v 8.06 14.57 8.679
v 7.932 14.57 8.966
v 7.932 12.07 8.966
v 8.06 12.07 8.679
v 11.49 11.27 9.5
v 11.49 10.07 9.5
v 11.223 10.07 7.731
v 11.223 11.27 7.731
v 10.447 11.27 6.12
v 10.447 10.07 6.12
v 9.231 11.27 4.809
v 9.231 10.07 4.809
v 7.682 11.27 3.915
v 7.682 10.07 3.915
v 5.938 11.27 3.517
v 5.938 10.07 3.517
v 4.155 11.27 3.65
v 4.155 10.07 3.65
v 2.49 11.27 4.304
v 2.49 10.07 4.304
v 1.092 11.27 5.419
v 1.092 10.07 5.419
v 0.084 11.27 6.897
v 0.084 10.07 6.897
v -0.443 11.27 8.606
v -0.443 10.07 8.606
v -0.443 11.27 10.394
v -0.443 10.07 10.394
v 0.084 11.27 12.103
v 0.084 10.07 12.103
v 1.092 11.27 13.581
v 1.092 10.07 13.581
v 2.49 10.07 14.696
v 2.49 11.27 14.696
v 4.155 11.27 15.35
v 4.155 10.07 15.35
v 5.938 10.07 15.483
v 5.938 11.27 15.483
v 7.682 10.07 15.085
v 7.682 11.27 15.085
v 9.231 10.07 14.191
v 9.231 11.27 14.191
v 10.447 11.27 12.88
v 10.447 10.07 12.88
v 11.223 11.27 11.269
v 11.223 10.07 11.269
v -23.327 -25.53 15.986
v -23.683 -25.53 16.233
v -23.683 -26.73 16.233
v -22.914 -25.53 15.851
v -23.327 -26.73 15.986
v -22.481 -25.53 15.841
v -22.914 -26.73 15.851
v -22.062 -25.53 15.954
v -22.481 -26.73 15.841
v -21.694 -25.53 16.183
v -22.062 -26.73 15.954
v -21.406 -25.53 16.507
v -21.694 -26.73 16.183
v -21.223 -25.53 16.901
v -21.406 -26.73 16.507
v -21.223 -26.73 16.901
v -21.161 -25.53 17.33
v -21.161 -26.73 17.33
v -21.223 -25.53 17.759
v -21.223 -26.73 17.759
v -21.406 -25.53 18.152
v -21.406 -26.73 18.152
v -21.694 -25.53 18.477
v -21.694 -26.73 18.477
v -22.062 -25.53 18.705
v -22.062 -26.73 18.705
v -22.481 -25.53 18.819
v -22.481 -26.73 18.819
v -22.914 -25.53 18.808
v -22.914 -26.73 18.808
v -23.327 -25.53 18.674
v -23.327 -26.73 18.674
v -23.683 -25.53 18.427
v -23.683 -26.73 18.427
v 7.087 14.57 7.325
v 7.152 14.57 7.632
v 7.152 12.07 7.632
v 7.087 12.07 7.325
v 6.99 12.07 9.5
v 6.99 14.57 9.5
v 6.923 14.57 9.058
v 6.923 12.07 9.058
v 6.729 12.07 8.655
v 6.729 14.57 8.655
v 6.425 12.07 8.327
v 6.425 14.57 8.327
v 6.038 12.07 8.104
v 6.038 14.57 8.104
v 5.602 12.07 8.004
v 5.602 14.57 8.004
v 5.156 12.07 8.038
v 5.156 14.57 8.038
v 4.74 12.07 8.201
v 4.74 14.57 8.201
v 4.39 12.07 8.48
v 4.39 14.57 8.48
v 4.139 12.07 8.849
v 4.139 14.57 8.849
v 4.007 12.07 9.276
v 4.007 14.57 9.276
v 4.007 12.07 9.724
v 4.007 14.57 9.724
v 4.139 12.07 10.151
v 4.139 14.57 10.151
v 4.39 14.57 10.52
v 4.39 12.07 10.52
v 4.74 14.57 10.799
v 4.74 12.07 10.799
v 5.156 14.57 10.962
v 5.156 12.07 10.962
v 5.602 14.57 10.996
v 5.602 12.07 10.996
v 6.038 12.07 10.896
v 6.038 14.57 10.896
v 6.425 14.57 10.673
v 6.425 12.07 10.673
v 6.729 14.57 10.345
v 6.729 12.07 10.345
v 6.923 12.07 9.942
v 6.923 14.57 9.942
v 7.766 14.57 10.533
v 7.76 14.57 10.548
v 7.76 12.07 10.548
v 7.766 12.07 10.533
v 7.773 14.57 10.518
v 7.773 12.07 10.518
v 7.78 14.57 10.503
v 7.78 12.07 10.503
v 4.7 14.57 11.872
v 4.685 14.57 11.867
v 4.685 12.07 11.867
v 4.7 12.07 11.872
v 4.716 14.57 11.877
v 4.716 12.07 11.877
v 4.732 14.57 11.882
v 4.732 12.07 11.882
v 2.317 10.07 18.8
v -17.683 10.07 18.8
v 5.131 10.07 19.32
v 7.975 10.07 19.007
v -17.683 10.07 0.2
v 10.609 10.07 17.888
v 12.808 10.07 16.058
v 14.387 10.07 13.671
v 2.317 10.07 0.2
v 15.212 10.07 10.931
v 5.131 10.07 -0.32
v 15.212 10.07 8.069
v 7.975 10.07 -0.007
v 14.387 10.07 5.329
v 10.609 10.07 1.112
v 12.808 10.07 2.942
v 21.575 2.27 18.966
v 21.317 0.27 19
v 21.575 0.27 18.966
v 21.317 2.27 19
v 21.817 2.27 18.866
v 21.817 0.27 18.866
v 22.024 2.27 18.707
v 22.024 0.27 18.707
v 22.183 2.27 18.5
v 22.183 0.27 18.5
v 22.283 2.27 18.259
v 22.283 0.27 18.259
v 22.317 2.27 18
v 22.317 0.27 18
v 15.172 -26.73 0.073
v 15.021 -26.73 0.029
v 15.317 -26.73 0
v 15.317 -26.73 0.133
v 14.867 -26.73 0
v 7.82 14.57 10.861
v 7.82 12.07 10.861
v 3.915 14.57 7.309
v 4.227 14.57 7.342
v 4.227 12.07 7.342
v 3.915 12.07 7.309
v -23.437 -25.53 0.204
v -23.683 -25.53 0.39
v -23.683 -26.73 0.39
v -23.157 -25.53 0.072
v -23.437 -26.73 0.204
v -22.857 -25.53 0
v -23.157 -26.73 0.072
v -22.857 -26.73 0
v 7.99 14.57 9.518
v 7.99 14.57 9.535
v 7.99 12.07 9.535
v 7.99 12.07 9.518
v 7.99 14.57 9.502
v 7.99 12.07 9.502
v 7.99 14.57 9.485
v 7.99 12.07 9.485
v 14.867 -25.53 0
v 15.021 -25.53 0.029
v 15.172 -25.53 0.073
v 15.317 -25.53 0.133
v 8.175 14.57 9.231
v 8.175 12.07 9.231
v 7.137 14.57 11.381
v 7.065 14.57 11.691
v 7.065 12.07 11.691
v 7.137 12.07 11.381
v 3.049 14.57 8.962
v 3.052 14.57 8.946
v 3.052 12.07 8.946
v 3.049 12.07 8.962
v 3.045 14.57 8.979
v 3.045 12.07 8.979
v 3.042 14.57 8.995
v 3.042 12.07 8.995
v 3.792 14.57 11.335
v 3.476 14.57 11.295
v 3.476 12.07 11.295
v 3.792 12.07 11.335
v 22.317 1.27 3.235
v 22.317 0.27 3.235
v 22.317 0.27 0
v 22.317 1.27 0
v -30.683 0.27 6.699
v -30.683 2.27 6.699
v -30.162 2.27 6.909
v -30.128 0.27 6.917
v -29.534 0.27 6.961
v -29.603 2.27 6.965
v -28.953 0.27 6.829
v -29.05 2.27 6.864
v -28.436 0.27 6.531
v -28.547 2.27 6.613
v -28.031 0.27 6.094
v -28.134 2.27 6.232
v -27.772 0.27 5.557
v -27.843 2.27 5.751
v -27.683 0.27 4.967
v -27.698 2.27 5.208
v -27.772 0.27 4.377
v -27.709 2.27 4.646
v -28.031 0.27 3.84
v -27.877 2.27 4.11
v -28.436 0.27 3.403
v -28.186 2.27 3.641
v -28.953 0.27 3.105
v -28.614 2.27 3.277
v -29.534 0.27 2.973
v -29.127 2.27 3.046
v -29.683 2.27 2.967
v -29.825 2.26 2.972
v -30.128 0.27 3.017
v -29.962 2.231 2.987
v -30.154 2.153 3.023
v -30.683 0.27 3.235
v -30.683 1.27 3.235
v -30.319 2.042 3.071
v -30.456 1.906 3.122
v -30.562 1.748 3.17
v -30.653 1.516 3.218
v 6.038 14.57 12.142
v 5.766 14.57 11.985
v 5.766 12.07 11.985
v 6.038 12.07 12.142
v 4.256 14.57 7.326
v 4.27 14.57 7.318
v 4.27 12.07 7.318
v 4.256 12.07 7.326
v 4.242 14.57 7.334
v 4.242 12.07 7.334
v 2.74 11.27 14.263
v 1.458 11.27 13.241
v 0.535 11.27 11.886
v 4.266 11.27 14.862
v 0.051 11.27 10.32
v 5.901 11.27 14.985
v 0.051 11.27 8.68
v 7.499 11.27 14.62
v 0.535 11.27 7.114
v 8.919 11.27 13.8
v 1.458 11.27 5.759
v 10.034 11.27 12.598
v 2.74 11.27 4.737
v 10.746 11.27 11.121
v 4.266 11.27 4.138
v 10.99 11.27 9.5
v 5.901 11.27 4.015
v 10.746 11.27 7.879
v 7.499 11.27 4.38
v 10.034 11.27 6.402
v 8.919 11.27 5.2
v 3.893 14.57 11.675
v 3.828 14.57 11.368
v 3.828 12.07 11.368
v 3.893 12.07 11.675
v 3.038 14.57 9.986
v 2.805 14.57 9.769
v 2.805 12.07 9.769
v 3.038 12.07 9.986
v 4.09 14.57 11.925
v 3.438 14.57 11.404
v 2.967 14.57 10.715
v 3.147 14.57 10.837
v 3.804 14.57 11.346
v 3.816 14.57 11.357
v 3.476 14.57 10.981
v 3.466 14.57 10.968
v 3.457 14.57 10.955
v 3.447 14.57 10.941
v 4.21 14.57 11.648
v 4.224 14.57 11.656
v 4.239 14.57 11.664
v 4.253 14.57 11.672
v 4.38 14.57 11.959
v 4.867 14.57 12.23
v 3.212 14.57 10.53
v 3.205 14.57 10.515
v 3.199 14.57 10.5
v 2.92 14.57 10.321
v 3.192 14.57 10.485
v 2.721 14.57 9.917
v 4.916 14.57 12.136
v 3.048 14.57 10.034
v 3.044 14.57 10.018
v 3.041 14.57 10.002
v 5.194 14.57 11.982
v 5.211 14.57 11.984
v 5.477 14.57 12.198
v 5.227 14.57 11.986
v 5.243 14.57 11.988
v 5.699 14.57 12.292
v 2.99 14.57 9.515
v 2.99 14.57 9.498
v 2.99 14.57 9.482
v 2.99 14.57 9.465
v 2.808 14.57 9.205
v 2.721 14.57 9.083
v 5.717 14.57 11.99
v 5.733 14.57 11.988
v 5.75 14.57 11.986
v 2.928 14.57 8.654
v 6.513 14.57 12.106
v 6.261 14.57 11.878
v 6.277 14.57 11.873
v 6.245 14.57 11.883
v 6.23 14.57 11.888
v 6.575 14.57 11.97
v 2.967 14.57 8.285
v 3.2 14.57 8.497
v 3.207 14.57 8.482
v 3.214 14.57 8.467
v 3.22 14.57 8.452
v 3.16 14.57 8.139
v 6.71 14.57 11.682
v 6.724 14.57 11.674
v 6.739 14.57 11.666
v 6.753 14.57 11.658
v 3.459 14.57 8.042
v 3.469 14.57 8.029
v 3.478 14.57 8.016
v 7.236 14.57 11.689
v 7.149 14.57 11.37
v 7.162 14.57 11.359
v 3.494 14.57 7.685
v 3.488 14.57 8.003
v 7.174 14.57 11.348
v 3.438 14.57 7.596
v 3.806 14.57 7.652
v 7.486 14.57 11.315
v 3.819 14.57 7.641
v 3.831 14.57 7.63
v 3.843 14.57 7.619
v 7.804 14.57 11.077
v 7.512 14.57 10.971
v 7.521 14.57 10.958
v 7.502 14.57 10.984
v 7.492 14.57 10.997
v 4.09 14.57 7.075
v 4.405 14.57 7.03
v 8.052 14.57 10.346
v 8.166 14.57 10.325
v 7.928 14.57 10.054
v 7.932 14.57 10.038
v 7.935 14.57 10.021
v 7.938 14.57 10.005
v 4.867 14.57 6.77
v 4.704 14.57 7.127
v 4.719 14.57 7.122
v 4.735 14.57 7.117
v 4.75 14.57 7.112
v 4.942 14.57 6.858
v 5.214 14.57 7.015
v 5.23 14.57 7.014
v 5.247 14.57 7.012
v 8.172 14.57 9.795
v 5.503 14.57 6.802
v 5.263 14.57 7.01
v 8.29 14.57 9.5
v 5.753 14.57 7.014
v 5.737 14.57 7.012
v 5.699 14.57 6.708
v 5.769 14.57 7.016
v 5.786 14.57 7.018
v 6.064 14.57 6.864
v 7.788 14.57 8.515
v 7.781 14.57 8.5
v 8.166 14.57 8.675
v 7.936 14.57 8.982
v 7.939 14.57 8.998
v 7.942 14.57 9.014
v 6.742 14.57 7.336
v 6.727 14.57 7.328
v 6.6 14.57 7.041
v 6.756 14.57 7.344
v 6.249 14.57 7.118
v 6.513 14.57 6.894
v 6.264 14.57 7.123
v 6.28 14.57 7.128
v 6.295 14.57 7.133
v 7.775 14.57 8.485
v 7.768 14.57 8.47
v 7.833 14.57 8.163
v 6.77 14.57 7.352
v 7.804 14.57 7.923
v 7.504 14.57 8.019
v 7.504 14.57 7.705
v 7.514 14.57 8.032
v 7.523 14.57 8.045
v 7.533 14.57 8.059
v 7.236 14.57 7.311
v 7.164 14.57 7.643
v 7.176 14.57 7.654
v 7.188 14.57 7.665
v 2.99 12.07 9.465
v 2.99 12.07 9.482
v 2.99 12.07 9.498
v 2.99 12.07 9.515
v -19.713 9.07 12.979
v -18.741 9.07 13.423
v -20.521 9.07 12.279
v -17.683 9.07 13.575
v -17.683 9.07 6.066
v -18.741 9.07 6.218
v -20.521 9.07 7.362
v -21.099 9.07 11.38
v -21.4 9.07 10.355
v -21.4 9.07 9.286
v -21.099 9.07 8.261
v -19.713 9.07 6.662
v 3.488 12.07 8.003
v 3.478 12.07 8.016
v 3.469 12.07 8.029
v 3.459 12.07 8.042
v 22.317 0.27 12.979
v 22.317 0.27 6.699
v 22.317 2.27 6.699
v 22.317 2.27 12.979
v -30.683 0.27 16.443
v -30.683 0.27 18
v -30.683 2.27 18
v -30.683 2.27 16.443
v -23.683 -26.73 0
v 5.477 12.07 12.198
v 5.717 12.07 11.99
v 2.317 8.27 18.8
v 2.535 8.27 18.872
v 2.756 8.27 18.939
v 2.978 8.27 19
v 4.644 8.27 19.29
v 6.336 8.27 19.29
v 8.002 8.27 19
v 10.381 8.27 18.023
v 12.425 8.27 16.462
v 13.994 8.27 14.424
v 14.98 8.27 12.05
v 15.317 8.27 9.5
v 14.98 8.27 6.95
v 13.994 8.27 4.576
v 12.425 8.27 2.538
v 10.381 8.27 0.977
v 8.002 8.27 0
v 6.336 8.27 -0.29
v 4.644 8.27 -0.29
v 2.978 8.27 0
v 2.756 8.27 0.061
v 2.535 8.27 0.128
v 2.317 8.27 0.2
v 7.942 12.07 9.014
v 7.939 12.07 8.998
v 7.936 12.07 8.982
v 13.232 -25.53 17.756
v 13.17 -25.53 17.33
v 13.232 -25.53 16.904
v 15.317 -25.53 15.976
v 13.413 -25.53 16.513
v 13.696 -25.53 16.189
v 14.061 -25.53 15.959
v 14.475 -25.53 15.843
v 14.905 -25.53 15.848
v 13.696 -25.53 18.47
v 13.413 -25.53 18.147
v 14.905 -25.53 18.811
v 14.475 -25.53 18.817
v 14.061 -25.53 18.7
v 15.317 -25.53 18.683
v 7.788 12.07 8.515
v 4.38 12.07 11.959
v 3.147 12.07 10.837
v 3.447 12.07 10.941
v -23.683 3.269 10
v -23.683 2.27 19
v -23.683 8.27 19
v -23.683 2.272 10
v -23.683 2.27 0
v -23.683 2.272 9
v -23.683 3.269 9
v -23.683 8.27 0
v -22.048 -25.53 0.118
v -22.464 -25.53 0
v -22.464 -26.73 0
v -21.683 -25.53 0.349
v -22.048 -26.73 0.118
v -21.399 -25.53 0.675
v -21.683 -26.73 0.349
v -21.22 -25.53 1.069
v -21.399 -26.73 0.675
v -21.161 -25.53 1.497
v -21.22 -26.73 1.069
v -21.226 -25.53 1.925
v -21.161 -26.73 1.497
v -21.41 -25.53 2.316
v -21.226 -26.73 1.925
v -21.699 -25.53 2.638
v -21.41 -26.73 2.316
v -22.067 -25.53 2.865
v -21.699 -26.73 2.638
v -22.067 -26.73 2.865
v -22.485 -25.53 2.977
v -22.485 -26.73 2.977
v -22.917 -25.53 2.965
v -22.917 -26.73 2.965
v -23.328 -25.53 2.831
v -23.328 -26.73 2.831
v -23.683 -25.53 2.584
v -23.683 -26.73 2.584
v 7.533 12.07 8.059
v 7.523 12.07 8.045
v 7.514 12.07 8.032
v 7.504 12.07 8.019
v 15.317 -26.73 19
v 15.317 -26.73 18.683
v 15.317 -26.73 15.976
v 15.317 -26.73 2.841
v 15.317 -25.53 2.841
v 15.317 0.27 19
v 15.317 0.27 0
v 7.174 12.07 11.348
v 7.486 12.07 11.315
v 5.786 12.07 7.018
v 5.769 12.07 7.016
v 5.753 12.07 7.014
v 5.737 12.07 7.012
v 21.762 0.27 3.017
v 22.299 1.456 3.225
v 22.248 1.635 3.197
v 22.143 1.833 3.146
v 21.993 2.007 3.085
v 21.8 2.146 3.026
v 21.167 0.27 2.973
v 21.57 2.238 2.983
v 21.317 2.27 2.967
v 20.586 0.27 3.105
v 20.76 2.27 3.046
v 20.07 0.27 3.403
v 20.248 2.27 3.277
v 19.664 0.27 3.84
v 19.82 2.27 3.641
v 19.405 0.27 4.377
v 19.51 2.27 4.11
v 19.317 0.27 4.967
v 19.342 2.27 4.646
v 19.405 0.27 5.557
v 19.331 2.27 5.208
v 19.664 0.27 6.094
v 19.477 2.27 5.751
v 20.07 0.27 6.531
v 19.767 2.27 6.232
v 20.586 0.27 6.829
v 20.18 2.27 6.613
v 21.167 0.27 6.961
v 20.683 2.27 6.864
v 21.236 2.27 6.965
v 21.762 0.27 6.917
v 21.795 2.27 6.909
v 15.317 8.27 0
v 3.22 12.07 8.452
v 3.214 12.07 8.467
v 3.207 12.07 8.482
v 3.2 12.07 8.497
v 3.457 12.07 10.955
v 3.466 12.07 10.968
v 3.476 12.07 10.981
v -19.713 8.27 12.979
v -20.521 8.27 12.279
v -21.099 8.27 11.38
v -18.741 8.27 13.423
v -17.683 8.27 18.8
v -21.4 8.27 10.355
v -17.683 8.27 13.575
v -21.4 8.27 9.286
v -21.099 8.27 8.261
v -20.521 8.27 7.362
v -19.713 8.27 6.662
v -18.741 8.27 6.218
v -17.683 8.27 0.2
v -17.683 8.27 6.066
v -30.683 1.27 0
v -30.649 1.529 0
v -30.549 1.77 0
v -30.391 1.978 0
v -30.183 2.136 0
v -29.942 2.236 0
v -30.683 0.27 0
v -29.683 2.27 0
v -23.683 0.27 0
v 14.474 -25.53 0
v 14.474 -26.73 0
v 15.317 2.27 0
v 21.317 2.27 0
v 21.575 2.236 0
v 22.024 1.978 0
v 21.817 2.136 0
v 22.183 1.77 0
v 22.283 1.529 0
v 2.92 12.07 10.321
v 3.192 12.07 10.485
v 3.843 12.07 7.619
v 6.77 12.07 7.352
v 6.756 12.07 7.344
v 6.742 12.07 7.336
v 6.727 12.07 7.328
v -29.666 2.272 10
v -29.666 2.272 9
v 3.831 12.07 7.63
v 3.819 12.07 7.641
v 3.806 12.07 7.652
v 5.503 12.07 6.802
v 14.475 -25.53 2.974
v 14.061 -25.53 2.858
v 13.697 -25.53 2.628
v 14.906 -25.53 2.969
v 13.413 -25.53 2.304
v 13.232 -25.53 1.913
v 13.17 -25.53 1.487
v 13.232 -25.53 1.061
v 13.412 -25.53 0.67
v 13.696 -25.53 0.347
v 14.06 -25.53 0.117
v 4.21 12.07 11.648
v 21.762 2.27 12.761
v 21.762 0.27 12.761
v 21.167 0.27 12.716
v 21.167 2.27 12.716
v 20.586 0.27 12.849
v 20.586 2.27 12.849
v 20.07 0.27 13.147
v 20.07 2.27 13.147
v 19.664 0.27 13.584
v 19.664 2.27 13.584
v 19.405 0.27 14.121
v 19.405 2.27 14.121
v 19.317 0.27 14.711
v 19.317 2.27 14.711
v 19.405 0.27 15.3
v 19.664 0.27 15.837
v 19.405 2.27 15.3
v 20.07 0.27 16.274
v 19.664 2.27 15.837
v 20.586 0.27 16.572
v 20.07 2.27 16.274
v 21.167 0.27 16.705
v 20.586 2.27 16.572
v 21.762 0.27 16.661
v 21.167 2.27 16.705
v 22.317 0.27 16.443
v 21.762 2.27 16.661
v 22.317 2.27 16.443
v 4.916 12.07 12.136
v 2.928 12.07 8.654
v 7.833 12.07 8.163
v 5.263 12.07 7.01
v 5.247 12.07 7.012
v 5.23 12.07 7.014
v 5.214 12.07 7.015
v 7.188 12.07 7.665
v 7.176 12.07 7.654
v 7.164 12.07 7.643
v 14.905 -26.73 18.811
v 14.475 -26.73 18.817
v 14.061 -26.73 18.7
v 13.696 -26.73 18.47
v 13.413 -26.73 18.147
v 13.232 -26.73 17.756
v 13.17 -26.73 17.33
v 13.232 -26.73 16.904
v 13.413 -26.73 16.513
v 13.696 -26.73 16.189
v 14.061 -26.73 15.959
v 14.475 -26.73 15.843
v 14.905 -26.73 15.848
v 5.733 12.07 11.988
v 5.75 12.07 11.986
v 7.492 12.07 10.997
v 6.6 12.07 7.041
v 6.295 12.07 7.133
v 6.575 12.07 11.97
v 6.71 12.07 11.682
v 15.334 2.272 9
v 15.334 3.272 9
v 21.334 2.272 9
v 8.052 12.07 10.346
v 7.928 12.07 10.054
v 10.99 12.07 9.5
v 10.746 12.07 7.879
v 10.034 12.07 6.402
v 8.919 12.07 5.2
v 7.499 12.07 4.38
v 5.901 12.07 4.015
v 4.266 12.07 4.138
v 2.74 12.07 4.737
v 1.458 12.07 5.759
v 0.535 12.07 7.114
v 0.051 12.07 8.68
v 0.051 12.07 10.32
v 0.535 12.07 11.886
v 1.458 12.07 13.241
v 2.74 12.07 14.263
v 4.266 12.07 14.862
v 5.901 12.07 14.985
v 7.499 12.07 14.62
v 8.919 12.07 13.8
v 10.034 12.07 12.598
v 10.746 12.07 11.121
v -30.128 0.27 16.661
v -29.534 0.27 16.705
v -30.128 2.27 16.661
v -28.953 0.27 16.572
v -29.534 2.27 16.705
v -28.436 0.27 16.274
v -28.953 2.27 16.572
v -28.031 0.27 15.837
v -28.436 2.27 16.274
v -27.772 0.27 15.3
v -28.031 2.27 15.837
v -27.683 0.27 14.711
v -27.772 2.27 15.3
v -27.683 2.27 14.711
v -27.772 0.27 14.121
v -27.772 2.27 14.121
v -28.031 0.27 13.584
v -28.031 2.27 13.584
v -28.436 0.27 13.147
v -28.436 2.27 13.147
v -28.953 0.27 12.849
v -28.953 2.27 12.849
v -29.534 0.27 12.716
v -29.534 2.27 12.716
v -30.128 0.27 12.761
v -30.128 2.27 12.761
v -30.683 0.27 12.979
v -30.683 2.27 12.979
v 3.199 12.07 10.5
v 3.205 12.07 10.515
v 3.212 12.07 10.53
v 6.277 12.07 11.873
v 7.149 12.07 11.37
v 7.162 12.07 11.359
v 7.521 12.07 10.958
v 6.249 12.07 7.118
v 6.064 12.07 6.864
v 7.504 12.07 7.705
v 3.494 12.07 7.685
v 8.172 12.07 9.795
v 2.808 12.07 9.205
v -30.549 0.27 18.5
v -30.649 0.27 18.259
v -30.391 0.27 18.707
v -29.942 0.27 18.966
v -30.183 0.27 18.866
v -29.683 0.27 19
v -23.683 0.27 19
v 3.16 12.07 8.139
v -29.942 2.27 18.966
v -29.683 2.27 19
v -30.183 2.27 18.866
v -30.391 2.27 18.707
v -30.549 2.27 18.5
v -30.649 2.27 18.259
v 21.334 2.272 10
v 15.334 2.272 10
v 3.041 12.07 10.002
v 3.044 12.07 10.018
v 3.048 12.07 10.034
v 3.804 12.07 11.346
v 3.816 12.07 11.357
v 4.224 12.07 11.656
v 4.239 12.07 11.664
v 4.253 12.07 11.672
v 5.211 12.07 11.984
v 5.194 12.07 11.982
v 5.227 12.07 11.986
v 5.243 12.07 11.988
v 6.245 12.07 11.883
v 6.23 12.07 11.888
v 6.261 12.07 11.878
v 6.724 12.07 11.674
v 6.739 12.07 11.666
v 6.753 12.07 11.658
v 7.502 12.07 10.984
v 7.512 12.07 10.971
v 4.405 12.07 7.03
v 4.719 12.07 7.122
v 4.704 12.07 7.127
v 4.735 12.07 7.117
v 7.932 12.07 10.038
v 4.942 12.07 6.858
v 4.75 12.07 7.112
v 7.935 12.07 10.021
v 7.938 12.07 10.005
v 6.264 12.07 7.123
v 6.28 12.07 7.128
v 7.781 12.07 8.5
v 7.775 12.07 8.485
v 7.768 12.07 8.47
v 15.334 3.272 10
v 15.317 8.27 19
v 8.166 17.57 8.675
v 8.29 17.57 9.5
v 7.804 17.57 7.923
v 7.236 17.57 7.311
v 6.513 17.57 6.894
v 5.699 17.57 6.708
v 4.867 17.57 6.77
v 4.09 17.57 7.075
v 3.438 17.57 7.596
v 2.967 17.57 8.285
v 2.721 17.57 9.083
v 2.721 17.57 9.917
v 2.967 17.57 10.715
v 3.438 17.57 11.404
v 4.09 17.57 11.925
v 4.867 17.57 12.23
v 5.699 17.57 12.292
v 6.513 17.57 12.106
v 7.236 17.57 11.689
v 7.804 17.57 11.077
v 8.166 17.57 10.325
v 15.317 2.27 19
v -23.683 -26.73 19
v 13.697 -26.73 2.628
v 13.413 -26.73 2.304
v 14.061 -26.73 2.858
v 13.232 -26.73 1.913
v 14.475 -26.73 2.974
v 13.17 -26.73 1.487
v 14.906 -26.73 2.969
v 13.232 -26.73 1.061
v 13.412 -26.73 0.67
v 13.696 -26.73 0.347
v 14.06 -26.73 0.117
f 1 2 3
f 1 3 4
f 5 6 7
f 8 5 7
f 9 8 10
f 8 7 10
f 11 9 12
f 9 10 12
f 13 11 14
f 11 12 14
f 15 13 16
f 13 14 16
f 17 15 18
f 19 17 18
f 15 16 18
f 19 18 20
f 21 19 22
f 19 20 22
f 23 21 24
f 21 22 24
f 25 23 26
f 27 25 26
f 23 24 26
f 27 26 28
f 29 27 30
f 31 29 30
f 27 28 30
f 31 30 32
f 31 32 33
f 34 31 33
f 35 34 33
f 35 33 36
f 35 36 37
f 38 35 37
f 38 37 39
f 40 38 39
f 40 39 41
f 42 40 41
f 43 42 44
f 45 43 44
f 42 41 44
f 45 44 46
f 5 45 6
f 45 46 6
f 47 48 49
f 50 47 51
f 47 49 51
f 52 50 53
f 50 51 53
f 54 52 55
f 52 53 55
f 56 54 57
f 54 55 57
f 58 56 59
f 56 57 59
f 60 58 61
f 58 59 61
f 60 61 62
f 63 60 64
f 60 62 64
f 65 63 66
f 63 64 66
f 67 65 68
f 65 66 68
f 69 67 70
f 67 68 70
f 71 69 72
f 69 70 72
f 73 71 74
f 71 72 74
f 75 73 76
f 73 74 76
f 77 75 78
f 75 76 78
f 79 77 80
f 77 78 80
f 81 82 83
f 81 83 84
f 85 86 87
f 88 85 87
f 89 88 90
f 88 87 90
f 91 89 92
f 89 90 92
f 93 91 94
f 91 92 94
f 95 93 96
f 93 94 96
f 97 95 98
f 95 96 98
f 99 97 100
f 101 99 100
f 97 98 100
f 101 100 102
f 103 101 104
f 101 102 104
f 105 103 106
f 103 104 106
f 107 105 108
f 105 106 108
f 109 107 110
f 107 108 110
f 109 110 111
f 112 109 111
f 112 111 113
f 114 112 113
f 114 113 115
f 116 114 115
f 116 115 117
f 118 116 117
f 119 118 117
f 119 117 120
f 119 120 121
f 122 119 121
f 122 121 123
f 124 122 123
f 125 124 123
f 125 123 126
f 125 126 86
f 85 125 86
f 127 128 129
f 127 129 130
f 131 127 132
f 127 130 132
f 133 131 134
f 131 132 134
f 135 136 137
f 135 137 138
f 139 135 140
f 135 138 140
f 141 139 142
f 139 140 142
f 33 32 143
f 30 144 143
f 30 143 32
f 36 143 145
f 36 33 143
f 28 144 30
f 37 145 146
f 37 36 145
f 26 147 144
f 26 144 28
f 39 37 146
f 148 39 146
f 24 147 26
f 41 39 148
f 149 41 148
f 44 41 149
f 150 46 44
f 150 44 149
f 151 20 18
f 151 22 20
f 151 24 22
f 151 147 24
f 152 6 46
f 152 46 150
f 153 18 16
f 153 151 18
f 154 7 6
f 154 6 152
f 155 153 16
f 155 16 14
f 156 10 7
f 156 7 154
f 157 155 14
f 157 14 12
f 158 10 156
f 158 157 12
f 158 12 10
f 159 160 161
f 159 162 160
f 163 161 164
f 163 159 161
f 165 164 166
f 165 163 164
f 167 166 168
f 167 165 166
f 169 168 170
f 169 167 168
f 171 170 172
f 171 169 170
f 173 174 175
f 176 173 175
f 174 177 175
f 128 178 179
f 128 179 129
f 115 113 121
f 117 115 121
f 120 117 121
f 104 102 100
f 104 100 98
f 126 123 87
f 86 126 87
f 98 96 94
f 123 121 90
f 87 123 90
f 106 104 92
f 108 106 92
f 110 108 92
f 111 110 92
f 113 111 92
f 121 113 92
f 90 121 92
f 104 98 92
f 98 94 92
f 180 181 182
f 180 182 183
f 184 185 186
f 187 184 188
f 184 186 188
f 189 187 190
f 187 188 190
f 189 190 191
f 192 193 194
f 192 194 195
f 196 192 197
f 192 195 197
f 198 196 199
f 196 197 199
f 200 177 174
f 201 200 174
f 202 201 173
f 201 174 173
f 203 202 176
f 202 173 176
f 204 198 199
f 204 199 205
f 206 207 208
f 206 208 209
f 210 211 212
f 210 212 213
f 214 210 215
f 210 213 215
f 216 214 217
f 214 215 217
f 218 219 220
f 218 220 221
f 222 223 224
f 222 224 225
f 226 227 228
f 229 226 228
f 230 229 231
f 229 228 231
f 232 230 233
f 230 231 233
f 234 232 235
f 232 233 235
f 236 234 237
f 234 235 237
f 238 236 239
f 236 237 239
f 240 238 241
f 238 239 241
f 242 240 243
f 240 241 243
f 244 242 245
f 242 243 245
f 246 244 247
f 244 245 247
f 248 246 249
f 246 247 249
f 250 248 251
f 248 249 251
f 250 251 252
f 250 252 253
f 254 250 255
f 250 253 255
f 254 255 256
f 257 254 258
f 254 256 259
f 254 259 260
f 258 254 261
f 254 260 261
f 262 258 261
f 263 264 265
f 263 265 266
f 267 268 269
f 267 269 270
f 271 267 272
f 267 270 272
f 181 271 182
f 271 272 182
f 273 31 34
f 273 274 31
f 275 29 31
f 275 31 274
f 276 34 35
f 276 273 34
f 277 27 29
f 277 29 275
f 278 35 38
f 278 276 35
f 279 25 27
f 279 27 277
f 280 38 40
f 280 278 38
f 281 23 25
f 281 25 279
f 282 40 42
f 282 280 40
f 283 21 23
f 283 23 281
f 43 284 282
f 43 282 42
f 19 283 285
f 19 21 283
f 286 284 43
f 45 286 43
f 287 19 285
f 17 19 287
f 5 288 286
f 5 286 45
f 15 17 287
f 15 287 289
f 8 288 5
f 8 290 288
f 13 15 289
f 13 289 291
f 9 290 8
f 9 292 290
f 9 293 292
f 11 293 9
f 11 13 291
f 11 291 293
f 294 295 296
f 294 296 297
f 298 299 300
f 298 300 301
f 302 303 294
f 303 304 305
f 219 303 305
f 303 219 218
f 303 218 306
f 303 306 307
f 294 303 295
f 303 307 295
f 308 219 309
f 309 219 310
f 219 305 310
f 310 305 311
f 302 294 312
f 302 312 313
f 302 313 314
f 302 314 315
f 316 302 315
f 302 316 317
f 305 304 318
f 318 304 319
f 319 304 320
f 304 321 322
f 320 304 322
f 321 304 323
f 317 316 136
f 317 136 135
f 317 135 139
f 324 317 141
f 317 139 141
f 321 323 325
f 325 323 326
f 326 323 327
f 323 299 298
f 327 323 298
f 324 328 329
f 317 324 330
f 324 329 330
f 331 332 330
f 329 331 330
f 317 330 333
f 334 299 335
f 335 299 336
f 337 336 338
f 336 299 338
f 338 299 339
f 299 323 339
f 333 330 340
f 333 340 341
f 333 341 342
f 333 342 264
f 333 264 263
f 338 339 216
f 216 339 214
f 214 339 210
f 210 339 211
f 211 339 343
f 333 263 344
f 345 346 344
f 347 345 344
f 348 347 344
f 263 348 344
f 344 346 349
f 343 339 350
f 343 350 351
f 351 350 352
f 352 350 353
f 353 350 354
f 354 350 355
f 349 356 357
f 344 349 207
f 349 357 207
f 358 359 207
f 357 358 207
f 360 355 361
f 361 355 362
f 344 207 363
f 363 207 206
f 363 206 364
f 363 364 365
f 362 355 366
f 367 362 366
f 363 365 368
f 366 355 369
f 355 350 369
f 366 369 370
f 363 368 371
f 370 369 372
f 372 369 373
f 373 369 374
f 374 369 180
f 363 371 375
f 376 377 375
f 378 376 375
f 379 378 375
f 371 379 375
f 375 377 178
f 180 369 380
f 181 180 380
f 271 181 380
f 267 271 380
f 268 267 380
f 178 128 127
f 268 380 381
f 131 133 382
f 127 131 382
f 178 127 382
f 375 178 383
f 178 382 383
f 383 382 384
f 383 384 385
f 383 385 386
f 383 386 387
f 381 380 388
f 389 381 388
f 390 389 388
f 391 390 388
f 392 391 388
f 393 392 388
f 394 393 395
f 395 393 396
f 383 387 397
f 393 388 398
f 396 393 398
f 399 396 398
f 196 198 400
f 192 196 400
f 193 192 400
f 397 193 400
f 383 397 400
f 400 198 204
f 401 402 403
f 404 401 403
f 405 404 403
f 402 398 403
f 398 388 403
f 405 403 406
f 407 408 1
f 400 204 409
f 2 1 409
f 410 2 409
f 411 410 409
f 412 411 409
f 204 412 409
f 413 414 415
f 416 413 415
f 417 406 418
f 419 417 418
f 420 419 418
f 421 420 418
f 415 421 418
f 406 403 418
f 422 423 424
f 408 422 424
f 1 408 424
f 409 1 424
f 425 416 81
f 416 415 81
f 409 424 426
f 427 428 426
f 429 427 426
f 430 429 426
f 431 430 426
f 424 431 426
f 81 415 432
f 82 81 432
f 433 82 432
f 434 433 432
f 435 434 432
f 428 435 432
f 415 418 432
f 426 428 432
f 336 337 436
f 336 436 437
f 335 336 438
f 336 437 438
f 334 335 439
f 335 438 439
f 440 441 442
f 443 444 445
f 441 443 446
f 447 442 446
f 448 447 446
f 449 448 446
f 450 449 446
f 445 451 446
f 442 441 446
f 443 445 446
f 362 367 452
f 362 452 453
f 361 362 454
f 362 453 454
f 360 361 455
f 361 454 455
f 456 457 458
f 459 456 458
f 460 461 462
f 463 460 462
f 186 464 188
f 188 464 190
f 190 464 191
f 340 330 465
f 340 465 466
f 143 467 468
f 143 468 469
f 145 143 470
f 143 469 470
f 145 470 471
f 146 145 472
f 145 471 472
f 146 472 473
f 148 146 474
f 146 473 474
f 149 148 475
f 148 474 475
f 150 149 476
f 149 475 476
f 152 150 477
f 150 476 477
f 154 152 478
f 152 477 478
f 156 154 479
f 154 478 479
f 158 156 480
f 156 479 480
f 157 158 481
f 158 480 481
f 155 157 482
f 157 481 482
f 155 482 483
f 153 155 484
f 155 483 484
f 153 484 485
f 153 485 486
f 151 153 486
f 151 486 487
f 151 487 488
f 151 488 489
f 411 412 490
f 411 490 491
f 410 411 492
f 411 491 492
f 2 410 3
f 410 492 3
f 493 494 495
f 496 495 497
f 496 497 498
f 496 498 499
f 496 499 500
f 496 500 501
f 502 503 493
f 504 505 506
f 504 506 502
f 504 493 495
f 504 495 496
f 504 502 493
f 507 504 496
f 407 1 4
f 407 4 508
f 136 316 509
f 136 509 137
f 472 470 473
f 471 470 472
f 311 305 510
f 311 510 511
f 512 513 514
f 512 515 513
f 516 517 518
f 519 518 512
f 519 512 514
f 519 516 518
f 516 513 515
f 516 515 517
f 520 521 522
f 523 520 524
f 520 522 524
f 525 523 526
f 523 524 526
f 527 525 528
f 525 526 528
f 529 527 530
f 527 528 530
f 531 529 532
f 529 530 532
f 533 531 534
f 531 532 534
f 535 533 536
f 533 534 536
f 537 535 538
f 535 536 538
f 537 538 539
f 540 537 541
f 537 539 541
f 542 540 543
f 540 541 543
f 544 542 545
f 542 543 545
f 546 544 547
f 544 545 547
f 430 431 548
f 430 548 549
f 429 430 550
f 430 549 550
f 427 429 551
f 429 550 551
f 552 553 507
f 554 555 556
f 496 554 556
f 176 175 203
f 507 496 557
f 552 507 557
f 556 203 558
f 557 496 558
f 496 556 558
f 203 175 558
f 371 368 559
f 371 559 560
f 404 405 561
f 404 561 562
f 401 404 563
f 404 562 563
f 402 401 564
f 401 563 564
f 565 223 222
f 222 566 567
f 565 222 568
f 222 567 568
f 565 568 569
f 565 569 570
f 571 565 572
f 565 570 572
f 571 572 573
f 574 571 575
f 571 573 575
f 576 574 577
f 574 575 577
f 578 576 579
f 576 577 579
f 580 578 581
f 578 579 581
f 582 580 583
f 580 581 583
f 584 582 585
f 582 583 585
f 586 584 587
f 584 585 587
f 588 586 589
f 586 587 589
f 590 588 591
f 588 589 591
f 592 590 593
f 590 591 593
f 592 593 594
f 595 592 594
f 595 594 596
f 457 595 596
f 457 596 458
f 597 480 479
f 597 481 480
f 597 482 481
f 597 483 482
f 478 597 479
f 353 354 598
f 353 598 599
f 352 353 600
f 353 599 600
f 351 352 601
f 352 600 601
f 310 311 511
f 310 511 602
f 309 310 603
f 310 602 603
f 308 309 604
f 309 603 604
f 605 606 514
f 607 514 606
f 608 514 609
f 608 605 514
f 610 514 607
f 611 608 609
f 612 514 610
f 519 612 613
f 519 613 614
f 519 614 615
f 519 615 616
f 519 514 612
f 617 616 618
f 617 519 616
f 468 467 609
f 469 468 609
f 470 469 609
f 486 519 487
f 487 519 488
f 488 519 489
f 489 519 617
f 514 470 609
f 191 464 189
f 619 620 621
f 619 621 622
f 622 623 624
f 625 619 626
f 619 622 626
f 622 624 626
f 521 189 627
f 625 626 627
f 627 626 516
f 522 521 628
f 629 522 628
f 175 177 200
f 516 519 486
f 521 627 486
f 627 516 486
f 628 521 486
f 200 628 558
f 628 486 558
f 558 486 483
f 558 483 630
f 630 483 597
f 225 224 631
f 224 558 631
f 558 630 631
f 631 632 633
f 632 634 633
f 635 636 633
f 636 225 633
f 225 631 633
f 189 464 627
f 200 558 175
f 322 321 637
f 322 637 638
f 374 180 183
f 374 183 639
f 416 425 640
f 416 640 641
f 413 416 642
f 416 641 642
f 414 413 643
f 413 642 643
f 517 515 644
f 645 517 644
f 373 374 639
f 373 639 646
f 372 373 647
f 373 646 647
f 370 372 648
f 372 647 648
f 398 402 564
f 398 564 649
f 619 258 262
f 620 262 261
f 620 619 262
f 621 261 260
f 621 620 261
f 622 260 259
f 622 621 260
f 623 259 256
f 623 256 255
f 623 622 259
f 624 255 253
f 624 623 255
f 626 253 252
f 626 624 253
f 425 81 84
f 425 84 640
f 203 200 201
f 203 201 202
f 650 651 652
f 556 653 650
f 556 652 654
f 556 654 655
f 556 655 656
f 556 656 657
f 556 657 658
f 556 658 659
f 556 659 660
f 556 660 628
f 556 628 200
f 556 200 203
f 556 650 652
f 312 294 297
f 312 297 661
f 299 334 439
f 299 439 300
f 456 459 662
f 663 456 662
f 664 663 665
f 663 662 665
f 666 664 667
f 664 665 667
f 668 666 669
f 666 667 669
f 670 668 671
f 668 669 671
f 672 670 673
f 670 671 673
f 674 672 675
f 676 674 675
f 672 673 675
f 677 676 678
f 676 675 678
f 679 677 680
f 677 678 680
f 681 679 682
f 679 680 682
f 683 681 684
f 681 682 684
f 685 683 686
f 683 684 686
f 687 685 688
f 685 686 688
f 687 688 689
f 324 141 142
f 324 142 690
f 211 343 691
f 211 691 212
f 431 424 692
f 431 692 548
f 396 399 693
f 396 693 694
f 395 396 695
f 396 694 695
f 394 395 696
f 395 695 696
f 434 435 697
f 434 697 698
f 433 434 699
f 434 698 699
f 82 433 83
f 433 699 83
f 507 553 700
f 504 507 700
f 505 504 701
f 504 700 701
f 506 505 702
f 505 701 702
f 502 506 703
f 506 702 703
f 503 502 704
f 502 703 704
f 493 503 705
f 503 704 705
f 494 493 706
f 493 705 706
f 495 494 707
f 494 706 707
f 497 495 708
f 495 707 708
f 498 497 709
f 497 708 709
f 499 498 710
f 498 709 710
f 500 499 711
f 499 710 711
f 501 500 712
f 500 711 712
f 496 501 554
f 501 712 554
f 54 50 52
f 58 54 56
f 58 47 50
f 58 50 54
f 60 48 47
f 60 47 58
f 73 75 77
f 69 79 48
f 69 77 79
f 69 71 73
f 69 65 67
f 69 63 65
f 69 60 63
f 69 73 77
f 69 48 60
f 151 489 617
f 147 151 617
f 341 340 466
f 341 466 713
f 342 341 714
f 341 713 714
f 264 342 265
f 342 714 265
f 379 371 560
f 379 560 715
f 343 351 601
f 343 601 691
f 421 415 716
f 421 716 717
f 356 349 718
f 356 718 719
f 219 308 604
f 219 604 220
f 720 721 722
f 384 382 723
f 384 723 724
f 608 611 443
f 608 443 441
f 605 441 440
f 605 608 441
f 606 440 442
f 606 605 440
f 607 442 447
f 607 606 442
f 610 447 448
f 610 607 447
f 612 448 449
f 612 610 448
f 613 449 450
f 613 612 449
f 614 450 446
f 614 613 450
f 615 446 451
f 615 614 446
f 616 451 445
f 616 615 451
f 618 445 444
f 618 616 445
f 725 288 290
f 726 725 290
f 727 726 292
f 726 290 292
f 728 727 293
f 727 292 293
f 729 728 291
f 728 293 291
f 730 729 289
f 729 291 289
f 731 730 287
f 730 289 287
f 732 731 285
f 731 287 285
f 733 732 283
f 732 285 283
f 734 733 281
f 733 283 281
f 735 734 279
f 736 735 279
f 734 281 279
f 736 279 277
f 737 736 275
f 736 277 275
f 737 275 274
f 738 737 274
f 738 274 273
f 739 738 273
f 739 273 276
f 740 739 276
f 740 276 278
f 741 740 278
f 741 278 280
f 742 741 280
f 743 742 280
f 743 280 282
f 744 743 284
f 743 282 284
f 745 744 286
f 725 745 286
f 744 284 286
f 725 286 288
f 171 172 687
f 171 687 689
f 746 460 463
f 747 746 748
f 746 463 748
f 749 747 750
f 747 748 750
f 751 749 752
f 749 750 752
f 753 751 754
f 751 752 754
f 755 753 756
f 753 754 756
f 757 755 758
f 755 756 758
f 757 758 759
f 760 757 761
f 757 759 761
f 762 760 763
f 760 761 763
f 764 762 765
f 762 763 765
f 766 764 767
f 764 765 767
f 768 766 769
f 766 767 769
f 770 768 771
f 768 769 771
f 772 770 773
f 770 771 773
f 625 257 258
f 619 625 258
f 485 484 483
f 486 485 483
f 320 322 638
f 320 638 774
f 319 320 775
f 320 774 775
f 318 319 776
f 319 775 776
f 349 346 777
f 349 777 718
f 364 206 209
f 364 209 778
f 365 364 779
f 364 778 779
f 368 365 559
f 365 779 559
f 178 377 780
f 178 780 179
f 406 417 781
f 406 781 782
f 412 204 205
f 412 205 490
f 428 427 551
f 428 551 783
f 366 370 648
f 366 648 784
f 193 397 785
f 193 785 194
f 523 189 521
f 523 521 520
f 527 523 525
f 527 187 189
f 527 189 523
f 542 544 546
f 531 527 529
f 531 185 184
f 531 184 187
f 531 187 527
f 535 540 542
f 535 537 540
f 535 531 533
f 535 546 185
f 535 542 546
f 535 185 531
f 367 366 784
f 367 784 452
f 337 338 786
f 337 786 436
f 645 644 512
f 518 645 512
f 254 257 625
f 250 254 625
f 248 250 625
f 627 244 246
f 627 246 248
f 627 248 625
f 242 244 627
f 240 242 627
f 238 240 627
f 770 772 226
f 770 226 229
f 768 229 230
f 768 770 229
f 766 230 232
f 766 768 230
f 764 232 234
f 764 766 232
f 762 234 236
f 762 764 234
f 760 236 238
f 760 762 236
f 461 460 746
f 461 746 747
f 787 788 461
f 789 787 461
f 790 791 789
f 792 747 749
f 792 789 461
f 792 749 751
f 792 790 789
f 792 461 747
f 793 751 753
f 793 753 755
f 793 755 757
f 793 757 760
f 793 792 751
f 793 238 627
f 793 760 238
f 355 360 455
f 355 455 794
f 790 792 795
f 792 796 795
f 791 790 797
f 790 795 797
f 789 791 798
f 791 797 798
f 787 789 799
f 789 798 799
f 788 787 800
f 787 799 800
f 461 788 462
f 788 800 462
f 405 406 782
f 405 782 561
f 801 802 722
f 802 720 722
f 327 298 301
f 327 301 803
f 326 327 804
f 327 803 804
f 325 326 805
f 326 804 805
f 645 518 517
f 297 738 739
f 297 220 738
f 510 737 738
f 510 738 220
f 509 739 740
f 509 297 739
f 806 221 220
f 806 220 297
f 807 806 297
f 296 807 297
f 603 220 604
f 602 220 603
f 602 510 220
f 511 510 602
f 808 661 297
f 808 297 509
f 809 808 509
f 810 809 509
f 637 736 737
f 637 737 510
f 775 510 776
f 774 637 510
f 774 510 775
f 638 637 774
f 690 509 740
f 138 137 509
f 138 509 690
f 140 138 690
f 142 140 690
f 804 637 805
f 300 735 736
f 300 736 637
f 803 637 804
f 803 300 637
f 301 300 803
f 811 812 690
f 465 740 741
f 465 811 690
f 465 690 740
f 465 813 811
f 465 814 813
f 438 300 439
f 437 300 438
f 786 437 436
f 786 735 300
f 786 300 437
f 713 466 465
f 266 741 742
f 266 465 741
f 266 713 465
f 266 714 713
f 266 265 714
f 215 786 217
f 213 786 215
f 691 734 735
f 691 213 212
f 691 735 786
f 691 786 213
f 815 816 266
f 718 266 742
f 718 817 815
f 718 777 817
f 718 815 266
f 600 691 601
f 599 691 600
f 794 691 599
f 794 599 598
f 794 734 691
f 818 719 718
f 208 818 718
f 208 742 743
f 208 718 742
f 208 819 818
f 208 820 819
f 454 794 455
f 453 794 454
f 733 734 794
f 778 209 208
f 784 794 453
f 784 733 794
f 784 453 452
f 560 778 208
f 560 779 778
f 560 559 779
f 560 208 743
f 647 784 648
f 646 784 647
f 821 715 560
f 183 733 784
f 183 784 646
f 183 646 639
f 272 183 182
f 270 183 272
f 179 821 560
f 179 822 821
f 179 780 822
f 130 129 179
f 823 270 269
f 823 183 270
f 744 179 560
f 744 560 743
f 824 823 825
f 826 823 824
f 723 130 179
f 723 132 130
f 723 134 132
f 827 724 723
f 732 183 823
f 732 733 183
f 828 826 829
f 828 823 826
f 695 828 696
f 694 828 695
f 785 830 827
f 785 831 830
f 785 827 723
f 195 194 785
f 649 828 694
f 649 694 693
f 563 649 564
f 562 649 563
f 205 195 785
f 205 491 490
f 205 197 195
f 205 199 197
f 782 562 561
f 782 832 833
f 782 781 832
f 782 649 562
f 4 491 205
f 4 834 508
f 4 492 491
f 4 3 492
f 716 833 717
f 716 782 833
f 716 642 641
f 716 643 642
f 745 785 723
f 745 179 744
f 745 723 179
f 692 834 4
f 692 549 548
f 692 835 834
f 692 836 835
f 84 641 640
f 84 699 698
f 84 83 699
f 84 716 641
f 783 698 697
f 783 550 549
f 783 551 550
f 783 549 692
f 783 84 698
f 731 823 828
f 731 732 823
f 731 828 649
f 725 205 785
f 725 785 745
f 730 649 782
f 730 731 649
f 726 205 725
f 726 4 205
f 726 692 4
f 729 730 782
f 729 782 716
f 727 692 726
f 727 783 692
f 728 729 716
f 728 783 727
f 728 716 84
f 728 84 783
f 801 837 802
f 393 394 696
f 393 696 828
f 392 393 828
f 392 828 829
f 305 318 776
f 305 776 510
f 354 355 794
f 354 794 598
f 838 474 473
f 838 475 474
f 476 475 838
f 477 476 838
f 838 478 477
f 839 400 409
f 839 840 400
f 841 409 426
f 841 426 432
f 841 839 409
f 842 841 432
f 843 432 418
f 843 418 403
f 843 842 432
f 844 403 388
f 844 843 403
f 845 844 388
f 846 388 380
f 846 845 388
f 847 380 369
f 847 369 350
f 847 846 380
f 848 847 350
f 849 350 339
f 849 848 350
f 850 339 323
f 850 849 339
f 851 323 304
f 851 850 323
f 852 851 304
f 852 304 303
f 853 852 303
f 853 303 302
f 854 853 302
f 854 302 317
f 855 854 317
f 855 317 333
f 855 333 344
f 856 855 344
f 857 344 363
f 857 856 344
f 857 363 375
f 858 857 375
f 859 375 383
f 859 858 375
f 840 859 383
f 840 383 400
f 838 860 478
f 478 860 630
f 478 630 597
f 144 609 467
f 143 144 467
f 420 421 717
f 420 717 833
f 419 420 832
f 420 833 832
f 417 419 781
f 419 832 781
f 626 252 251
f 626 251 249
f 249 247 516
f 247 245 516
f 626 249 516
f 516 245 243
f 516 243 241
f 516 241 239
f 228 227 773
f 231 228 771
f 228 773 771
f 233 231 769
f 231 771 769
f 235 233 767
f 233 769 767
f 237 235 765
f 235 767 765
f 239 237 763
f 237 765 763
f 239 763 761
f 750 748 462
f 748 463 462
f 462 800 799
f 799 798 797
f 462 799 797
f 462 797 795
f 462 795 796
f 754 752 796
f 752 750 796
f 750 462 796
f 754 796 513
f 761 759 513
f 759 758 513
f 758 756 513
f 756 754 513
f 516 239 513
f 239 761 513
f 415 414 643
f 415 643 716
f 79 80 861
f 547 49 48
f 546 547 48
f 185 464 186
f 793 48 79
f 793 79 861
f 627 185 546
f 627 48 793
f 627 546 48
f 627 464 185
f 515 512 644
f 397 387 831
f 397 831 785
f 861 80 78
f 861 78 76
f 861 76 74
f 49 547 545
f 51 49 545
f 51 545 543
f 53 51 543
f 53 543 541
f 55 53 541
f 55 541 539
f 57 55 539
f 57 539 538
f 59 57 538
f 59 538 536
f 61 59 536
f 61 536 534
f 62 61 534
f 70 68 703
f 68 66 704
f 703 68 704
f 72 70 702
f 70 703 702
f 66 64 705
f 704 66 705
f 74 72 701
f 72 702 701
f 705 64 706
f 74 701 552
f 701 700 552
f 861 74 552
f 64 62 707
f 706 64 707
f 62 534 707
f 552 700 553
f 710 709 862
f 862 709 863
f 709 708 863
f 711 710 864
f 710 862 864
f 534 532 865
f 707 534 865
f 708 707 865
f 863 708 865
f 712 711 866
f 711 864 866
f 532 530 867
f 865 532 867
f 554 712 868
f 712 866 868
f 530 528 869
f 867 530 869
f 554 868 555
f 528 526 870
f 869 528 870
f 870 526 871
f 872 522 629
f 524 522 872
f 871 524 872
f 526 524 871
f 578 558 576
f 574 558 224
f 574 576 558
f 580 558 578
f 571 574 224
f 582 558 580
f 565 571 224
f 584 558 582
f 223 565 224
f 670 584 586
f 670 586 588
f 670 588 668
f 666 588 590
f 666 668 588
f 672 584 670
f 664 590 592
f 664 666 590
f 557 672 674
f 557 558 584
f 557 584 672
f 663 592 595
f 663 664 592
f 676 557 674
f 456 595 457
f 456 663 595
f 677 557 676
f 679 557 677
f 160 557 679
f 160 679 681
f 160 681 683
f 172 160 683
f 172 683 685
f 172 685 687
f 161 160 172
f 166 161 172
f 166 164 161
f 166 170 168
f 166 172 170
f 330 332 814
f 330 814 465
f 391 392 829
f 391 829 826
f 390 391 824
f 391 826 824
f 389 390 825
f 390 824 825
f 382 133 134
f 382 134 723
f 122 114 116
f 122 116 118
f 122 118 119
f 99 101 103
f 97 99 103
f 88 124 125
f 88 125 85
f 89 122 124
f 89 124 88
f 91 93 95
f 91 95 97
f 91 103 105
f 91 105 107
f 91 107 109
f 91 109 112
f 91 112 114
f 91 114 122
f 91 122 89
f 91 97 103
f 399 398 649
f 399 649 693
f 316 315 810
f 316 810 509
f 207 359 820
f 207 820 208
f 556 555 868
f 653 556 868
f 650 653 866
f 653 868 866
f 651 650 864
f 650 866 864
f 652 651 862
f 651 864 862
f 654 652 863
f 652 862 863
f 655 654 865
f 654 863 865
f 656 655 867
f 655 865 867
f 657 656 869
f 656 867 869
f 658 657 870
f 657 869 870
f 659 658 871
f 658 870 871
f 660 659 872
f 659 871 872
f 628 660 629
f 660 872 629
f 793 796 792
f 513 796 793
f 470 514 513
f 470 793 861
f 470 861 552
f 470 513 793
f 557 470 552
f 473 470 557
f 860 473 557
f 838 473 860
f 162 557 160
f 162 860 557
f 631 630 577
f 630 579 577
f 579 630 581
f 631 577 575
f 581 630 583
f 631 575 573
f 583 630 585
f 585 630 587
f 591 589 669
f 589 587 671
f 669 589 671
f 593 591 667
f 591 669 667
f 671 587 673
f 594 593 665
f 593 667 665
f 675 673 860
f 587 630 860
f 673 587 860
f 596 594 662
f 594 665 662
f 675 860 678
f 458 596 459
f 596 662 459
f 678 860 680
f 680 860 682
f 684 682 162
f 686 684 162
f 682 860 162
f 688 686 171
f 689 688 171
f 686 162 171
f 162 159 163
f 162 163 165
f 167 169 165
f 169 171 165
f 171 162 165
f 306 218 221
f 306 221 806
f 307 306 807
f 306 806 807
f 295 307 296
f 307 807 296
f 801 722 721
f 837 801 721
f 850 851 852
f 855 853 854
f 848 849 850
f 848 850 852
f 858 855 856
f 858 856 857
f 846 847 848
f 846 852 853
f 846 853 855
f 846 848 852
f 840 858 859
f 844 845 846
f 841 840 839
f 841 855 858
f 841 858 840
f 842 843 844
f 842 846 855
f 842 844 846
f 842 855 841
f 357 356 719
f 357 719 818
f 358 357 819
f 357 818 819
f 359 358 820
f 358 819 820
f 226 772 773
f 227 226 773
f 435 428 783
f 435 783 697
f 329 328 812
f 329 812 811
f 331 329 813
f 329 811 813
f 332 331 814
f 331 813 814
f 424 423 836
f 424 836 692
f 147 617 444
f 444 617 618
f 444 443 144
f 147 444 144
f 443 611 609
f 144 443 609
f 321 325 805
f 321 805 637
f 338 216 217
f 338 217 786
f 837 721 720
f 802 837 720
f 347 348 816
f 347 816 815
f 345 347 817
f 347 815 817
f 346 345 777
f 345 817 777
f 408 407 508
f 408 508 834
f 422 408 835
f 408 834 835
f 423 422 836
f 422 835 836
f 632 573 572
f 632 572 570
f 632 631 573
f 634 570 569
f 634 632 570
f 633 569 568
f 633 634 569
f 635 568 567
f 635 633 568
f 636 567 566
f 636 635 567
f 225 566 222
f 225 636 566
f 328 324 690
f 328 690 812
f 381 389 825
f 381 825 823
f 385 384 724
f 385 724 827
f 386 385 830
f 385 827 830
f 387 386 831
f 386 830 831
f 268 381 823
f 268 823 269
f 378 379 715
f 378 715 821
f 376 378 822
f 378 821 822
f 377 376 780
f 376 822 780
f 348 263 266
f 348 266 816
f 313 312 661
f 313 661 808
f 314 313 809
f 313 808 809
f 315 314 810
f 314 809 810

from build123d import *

# Parameters (mm, degrees)
SKETCH1_W            = 39
SKETCH1_H            = 35
BOSS_EXTRUDE1_DEPTH  = 19
SKETCH2_W            = 7
SKETCH2_H            = 2
BOSS_EXTRUDE2_DEPTH  = 19
BOSS_EXTRUDE3_DEPTH  = 0.5
SKETCH4_R            = 2
CUT_EXTRUDE1_DEPTH   = 3
FILLET1_R            = 1
BOSS_EXTRUDE4_DEPTH  = 1.8
SKETCH6_R            = 1.5
CUT_EXTRUDE2_DEPTH   = 1.2
SKETCH7_R            = 6
BOSS_EXTRUDE5_DEPTH  = 1.2
SKETCH8_R            = 5.5
BOSS_EXTRUDE6_DEPTH  = 0.8
BOSS_EXTRUDE7_DEPTH  = 0.8
SKETCH10_R           = 2.5
BOSS_EXTRUDE8_DEPTH  = 4
BOSS_EXTRUDE9_DEPTH  = 4
CIRPATTERN2_COUNT    = 30
SKETCH12_R           = 1.5
CUT_EXTRUDE4_DEPTH   = 4
SKETCH13_R           = 2.8
BOSS_EXTRUDE10_DEPTH = 1.5


with BuildPart() as part:
    # Sketch1 → Boss-Extrude1 (new body)
    with BuildSketch(Plane.XY):
        with Locations((-4.183412042, -9.229571984)):
            Rectangle(SKETCH1_W, SKETCH1_H)
    extrude(amount=BOSS_EXTRUDE1_DEPTH)

    # Sketch2 → Boss-Extrude2 (add)
    with BuildSketch(Plane.XY.offset(19)):
        with Locations((18.816587958, 1.270428016)):
            Rectangle(SKETCH2_W, SKETCH2_H)
        with Locations((-27.183412042, 1.270428016)):
            Rectangle(SKETCH2_W, SKETCH2_H)
    extrude(amount=-BOSS_EXTRUDE2_DEPTH)

    # Sketch3 → Boss-Extrude3 (add, symmetric)
    with BuildSketch(Plane.XY.offset(9.5)):
        Polygon((15.333582704, 3.272295291), (15.333582704, 2.272295291), (21.333582704, 2.272295291), align=None)
        Polygon((-29.666485395, 2.272295291), (-23.666485395, 3.272295291), (-23.666485395, 2.272295291), align=None)
    extrude(amount=BOSS_EXTRUDE3_DEPTH, both=True)

    # Sketch4 → Cut-Extrude1 (cut)
    with BuildSketch(Plane(origin=(0, 2.270428016, 0), x_dir=(1, 0, 0), z_dir=(0, 1, 0))):
        with Locations((21.316587958, -14.710690781)):
            Circle(SKETCH4_R)
        with Locations((21.316587958, -4.967002747)):
            Circle(SKETCH4_R)
        with Locations((-29.683412042, -14.710690781)):
            Circle(SKETCH4_R)
        with Locations((-29.683412042, -4.967002747)):
            Circle(SKETCH4_R)
    extrude(amount=-CUT_EXTRUDE1_DEPTH, mode=Mode.SUBTRACT)

    # Fillet1
    fillet1_edges = [part.edges().sort_by_distance(p)[0] for p in [
        (-30.683412042, 1.270428016, 19),
        (-30.683412042, 2.270428016, 1.61747597),
        (22.316587958, 2.270428016, 1.61747597),
        (22.316587958, 1.270428016, 19),
    ]]
    fillet(fillet1_edges, radius=FILLET1_R)

    # Sketch5 → Boss-Extrude4 (add)
    with BuildSketch(Plane(origin=(0, 8.270428016, 0), x_dir=(1, 0, 0), z_dir=(0, 1, 0))):
        with BuildLine():
            Line((-17.683412042, -0.2), (-17.683412042, -18.8))
            Line((-17.683412042, -18.8), (2.316587958, -18.8))
            ThreePointArc((2.316587958, -18.8), (15.316587958, -9.5), (2.316587958, -0.2))
            Line((2.316587958, -0.2), (-17.683412042, -0.2))
        make_face()
    extrude(amount=BOSS_EXTRUDE4_DEPTH)

    # Sketch6 → Cut-Extrude2 (cut)
    with BuildSketch(Plane.XZ.offset(26.729571984)):
        with Locations((-22.660585011, 17.329722527)):
            Circle(SKETCH6_R)
        with Locations((-22.660585011, 1.487126069)):
            Circle(SKETCH6_R)
        with Locations((14.670467636, 17.329722527)):
            Circle(SKETCH6_R)
        with Locations((14.670467636, 1.487126069)):
            Circle(SKETCH6_R)
    extrude(amount=-CUT_EXTRUDE2_DEPTH, mode=Mode.SUBTRACT)

    # Sketch7 → Boss-Extrude5 (add)
    with BuildSketch(Plane(origin=(0, 10.070428016, 0), x_dir=(1, 0, 0), z_dir=(0, 1, 0))):
        with Locations((5.490049496, -9.5)):
            Circle(SKETCH7_R)
    extrude(amount=BOSS_EXTRUDE5_DEPTH)

    # Sketch8 → Boss-Extrude6 (add)
    with BuildSketch(Plane(origin=(0, 11.270428016, 0), x_dir=(1, 0, 0), z_dir=(0, 1, 0))):
        with Locations((5.490049496, -9.5)):
            Circle(SKETCH8_R)
    extrude(amount=BOSS_EXTRUDE6_DEPTH)

    # Sketch9 → Boss-Extrude7 (add)
    with BuildSketch(Plane(origin=(0, 8.270428016, 0), x_dir=(1, 0, 0), z_dir=(0, 1, 0))):
        with BuildLine():
            Line((-17.683412042, -6.065911172), (-17.683412042, -13.575118742))
            ThreePointArc((-17.683412042, -13.575118742), (-21.438015827, -9.820514957), (-17.683412042, -6.065911172))
        make_face()
    extrude(amount=BOSS_EXTRUDE7_DEPTH)

    # Sketch10 → Boss-Extrude8 (add)
    with BuildSketch(Plane(origin=(0, 12.070428016, 0), x_dir=(1, 0, 0), z_dir=(0, 1, 0))):
        with Locations((5.490049496, -9.5)):
            Circle(SKETCH10_R)
    extrude(amount=BOSS_EXTRUDE8_DEPTH)

    # Sketch11 → Boss-Extrude9 (add)
    with BuildSketch(Plane(origin=(0, 16.070428016, 0), x_dir=(1, 0, 0), z_dir=(0, 1, 0))):
        Polygon((5.503448723, -6.801928291), (5.263137454, -7.010319112), (5.736737319, -7.012200748), align=None)
    boss_extrude9 = extrude(amount=-BOSS_EXTRUDE9_DEPTH)

    # CirPattern2: Boss-Extrude9 ×30 about axis
    cirpattern2_axis = Axis((5.490049496, 0, 9.5), (0, 1, 0))
    for i in range(1, CIRPATTERN2_COUNT):
        add(boss_extrude9.rotate(cirpattern2_axis, i * 360 / CIRPATTERN2_COUNT))

    # Sketch12 → Cut-Extrude4 (cut)
    with BuildSketch(Plane(origin=(0, 16.070428016, 0), x_dir=(1, 0, 0), z_dir=(0, 1, 0))):
        with Locations((5.490049496, -9.5)):
            Circle(SKETCH12_R)
    extrude(amount=-CUT_EXTRUDE4_DEPTH, mode=Mode.SUBTRACT)

    # Sketch13 → Boss-Extrude10 (add, symmetric)
    with BuildSketch(Plane(origin=(0, 16.070428016, 0), x_dir=(1, 0, 0), z_dir=(0, 1, 0))):
        with Locations((5.490049496, -9.5)):
            Circle(SKETCH13_R)
    extrude(amount=BOSS_EXTRUDE10_DEPTH, both=True)


solid = part.part
